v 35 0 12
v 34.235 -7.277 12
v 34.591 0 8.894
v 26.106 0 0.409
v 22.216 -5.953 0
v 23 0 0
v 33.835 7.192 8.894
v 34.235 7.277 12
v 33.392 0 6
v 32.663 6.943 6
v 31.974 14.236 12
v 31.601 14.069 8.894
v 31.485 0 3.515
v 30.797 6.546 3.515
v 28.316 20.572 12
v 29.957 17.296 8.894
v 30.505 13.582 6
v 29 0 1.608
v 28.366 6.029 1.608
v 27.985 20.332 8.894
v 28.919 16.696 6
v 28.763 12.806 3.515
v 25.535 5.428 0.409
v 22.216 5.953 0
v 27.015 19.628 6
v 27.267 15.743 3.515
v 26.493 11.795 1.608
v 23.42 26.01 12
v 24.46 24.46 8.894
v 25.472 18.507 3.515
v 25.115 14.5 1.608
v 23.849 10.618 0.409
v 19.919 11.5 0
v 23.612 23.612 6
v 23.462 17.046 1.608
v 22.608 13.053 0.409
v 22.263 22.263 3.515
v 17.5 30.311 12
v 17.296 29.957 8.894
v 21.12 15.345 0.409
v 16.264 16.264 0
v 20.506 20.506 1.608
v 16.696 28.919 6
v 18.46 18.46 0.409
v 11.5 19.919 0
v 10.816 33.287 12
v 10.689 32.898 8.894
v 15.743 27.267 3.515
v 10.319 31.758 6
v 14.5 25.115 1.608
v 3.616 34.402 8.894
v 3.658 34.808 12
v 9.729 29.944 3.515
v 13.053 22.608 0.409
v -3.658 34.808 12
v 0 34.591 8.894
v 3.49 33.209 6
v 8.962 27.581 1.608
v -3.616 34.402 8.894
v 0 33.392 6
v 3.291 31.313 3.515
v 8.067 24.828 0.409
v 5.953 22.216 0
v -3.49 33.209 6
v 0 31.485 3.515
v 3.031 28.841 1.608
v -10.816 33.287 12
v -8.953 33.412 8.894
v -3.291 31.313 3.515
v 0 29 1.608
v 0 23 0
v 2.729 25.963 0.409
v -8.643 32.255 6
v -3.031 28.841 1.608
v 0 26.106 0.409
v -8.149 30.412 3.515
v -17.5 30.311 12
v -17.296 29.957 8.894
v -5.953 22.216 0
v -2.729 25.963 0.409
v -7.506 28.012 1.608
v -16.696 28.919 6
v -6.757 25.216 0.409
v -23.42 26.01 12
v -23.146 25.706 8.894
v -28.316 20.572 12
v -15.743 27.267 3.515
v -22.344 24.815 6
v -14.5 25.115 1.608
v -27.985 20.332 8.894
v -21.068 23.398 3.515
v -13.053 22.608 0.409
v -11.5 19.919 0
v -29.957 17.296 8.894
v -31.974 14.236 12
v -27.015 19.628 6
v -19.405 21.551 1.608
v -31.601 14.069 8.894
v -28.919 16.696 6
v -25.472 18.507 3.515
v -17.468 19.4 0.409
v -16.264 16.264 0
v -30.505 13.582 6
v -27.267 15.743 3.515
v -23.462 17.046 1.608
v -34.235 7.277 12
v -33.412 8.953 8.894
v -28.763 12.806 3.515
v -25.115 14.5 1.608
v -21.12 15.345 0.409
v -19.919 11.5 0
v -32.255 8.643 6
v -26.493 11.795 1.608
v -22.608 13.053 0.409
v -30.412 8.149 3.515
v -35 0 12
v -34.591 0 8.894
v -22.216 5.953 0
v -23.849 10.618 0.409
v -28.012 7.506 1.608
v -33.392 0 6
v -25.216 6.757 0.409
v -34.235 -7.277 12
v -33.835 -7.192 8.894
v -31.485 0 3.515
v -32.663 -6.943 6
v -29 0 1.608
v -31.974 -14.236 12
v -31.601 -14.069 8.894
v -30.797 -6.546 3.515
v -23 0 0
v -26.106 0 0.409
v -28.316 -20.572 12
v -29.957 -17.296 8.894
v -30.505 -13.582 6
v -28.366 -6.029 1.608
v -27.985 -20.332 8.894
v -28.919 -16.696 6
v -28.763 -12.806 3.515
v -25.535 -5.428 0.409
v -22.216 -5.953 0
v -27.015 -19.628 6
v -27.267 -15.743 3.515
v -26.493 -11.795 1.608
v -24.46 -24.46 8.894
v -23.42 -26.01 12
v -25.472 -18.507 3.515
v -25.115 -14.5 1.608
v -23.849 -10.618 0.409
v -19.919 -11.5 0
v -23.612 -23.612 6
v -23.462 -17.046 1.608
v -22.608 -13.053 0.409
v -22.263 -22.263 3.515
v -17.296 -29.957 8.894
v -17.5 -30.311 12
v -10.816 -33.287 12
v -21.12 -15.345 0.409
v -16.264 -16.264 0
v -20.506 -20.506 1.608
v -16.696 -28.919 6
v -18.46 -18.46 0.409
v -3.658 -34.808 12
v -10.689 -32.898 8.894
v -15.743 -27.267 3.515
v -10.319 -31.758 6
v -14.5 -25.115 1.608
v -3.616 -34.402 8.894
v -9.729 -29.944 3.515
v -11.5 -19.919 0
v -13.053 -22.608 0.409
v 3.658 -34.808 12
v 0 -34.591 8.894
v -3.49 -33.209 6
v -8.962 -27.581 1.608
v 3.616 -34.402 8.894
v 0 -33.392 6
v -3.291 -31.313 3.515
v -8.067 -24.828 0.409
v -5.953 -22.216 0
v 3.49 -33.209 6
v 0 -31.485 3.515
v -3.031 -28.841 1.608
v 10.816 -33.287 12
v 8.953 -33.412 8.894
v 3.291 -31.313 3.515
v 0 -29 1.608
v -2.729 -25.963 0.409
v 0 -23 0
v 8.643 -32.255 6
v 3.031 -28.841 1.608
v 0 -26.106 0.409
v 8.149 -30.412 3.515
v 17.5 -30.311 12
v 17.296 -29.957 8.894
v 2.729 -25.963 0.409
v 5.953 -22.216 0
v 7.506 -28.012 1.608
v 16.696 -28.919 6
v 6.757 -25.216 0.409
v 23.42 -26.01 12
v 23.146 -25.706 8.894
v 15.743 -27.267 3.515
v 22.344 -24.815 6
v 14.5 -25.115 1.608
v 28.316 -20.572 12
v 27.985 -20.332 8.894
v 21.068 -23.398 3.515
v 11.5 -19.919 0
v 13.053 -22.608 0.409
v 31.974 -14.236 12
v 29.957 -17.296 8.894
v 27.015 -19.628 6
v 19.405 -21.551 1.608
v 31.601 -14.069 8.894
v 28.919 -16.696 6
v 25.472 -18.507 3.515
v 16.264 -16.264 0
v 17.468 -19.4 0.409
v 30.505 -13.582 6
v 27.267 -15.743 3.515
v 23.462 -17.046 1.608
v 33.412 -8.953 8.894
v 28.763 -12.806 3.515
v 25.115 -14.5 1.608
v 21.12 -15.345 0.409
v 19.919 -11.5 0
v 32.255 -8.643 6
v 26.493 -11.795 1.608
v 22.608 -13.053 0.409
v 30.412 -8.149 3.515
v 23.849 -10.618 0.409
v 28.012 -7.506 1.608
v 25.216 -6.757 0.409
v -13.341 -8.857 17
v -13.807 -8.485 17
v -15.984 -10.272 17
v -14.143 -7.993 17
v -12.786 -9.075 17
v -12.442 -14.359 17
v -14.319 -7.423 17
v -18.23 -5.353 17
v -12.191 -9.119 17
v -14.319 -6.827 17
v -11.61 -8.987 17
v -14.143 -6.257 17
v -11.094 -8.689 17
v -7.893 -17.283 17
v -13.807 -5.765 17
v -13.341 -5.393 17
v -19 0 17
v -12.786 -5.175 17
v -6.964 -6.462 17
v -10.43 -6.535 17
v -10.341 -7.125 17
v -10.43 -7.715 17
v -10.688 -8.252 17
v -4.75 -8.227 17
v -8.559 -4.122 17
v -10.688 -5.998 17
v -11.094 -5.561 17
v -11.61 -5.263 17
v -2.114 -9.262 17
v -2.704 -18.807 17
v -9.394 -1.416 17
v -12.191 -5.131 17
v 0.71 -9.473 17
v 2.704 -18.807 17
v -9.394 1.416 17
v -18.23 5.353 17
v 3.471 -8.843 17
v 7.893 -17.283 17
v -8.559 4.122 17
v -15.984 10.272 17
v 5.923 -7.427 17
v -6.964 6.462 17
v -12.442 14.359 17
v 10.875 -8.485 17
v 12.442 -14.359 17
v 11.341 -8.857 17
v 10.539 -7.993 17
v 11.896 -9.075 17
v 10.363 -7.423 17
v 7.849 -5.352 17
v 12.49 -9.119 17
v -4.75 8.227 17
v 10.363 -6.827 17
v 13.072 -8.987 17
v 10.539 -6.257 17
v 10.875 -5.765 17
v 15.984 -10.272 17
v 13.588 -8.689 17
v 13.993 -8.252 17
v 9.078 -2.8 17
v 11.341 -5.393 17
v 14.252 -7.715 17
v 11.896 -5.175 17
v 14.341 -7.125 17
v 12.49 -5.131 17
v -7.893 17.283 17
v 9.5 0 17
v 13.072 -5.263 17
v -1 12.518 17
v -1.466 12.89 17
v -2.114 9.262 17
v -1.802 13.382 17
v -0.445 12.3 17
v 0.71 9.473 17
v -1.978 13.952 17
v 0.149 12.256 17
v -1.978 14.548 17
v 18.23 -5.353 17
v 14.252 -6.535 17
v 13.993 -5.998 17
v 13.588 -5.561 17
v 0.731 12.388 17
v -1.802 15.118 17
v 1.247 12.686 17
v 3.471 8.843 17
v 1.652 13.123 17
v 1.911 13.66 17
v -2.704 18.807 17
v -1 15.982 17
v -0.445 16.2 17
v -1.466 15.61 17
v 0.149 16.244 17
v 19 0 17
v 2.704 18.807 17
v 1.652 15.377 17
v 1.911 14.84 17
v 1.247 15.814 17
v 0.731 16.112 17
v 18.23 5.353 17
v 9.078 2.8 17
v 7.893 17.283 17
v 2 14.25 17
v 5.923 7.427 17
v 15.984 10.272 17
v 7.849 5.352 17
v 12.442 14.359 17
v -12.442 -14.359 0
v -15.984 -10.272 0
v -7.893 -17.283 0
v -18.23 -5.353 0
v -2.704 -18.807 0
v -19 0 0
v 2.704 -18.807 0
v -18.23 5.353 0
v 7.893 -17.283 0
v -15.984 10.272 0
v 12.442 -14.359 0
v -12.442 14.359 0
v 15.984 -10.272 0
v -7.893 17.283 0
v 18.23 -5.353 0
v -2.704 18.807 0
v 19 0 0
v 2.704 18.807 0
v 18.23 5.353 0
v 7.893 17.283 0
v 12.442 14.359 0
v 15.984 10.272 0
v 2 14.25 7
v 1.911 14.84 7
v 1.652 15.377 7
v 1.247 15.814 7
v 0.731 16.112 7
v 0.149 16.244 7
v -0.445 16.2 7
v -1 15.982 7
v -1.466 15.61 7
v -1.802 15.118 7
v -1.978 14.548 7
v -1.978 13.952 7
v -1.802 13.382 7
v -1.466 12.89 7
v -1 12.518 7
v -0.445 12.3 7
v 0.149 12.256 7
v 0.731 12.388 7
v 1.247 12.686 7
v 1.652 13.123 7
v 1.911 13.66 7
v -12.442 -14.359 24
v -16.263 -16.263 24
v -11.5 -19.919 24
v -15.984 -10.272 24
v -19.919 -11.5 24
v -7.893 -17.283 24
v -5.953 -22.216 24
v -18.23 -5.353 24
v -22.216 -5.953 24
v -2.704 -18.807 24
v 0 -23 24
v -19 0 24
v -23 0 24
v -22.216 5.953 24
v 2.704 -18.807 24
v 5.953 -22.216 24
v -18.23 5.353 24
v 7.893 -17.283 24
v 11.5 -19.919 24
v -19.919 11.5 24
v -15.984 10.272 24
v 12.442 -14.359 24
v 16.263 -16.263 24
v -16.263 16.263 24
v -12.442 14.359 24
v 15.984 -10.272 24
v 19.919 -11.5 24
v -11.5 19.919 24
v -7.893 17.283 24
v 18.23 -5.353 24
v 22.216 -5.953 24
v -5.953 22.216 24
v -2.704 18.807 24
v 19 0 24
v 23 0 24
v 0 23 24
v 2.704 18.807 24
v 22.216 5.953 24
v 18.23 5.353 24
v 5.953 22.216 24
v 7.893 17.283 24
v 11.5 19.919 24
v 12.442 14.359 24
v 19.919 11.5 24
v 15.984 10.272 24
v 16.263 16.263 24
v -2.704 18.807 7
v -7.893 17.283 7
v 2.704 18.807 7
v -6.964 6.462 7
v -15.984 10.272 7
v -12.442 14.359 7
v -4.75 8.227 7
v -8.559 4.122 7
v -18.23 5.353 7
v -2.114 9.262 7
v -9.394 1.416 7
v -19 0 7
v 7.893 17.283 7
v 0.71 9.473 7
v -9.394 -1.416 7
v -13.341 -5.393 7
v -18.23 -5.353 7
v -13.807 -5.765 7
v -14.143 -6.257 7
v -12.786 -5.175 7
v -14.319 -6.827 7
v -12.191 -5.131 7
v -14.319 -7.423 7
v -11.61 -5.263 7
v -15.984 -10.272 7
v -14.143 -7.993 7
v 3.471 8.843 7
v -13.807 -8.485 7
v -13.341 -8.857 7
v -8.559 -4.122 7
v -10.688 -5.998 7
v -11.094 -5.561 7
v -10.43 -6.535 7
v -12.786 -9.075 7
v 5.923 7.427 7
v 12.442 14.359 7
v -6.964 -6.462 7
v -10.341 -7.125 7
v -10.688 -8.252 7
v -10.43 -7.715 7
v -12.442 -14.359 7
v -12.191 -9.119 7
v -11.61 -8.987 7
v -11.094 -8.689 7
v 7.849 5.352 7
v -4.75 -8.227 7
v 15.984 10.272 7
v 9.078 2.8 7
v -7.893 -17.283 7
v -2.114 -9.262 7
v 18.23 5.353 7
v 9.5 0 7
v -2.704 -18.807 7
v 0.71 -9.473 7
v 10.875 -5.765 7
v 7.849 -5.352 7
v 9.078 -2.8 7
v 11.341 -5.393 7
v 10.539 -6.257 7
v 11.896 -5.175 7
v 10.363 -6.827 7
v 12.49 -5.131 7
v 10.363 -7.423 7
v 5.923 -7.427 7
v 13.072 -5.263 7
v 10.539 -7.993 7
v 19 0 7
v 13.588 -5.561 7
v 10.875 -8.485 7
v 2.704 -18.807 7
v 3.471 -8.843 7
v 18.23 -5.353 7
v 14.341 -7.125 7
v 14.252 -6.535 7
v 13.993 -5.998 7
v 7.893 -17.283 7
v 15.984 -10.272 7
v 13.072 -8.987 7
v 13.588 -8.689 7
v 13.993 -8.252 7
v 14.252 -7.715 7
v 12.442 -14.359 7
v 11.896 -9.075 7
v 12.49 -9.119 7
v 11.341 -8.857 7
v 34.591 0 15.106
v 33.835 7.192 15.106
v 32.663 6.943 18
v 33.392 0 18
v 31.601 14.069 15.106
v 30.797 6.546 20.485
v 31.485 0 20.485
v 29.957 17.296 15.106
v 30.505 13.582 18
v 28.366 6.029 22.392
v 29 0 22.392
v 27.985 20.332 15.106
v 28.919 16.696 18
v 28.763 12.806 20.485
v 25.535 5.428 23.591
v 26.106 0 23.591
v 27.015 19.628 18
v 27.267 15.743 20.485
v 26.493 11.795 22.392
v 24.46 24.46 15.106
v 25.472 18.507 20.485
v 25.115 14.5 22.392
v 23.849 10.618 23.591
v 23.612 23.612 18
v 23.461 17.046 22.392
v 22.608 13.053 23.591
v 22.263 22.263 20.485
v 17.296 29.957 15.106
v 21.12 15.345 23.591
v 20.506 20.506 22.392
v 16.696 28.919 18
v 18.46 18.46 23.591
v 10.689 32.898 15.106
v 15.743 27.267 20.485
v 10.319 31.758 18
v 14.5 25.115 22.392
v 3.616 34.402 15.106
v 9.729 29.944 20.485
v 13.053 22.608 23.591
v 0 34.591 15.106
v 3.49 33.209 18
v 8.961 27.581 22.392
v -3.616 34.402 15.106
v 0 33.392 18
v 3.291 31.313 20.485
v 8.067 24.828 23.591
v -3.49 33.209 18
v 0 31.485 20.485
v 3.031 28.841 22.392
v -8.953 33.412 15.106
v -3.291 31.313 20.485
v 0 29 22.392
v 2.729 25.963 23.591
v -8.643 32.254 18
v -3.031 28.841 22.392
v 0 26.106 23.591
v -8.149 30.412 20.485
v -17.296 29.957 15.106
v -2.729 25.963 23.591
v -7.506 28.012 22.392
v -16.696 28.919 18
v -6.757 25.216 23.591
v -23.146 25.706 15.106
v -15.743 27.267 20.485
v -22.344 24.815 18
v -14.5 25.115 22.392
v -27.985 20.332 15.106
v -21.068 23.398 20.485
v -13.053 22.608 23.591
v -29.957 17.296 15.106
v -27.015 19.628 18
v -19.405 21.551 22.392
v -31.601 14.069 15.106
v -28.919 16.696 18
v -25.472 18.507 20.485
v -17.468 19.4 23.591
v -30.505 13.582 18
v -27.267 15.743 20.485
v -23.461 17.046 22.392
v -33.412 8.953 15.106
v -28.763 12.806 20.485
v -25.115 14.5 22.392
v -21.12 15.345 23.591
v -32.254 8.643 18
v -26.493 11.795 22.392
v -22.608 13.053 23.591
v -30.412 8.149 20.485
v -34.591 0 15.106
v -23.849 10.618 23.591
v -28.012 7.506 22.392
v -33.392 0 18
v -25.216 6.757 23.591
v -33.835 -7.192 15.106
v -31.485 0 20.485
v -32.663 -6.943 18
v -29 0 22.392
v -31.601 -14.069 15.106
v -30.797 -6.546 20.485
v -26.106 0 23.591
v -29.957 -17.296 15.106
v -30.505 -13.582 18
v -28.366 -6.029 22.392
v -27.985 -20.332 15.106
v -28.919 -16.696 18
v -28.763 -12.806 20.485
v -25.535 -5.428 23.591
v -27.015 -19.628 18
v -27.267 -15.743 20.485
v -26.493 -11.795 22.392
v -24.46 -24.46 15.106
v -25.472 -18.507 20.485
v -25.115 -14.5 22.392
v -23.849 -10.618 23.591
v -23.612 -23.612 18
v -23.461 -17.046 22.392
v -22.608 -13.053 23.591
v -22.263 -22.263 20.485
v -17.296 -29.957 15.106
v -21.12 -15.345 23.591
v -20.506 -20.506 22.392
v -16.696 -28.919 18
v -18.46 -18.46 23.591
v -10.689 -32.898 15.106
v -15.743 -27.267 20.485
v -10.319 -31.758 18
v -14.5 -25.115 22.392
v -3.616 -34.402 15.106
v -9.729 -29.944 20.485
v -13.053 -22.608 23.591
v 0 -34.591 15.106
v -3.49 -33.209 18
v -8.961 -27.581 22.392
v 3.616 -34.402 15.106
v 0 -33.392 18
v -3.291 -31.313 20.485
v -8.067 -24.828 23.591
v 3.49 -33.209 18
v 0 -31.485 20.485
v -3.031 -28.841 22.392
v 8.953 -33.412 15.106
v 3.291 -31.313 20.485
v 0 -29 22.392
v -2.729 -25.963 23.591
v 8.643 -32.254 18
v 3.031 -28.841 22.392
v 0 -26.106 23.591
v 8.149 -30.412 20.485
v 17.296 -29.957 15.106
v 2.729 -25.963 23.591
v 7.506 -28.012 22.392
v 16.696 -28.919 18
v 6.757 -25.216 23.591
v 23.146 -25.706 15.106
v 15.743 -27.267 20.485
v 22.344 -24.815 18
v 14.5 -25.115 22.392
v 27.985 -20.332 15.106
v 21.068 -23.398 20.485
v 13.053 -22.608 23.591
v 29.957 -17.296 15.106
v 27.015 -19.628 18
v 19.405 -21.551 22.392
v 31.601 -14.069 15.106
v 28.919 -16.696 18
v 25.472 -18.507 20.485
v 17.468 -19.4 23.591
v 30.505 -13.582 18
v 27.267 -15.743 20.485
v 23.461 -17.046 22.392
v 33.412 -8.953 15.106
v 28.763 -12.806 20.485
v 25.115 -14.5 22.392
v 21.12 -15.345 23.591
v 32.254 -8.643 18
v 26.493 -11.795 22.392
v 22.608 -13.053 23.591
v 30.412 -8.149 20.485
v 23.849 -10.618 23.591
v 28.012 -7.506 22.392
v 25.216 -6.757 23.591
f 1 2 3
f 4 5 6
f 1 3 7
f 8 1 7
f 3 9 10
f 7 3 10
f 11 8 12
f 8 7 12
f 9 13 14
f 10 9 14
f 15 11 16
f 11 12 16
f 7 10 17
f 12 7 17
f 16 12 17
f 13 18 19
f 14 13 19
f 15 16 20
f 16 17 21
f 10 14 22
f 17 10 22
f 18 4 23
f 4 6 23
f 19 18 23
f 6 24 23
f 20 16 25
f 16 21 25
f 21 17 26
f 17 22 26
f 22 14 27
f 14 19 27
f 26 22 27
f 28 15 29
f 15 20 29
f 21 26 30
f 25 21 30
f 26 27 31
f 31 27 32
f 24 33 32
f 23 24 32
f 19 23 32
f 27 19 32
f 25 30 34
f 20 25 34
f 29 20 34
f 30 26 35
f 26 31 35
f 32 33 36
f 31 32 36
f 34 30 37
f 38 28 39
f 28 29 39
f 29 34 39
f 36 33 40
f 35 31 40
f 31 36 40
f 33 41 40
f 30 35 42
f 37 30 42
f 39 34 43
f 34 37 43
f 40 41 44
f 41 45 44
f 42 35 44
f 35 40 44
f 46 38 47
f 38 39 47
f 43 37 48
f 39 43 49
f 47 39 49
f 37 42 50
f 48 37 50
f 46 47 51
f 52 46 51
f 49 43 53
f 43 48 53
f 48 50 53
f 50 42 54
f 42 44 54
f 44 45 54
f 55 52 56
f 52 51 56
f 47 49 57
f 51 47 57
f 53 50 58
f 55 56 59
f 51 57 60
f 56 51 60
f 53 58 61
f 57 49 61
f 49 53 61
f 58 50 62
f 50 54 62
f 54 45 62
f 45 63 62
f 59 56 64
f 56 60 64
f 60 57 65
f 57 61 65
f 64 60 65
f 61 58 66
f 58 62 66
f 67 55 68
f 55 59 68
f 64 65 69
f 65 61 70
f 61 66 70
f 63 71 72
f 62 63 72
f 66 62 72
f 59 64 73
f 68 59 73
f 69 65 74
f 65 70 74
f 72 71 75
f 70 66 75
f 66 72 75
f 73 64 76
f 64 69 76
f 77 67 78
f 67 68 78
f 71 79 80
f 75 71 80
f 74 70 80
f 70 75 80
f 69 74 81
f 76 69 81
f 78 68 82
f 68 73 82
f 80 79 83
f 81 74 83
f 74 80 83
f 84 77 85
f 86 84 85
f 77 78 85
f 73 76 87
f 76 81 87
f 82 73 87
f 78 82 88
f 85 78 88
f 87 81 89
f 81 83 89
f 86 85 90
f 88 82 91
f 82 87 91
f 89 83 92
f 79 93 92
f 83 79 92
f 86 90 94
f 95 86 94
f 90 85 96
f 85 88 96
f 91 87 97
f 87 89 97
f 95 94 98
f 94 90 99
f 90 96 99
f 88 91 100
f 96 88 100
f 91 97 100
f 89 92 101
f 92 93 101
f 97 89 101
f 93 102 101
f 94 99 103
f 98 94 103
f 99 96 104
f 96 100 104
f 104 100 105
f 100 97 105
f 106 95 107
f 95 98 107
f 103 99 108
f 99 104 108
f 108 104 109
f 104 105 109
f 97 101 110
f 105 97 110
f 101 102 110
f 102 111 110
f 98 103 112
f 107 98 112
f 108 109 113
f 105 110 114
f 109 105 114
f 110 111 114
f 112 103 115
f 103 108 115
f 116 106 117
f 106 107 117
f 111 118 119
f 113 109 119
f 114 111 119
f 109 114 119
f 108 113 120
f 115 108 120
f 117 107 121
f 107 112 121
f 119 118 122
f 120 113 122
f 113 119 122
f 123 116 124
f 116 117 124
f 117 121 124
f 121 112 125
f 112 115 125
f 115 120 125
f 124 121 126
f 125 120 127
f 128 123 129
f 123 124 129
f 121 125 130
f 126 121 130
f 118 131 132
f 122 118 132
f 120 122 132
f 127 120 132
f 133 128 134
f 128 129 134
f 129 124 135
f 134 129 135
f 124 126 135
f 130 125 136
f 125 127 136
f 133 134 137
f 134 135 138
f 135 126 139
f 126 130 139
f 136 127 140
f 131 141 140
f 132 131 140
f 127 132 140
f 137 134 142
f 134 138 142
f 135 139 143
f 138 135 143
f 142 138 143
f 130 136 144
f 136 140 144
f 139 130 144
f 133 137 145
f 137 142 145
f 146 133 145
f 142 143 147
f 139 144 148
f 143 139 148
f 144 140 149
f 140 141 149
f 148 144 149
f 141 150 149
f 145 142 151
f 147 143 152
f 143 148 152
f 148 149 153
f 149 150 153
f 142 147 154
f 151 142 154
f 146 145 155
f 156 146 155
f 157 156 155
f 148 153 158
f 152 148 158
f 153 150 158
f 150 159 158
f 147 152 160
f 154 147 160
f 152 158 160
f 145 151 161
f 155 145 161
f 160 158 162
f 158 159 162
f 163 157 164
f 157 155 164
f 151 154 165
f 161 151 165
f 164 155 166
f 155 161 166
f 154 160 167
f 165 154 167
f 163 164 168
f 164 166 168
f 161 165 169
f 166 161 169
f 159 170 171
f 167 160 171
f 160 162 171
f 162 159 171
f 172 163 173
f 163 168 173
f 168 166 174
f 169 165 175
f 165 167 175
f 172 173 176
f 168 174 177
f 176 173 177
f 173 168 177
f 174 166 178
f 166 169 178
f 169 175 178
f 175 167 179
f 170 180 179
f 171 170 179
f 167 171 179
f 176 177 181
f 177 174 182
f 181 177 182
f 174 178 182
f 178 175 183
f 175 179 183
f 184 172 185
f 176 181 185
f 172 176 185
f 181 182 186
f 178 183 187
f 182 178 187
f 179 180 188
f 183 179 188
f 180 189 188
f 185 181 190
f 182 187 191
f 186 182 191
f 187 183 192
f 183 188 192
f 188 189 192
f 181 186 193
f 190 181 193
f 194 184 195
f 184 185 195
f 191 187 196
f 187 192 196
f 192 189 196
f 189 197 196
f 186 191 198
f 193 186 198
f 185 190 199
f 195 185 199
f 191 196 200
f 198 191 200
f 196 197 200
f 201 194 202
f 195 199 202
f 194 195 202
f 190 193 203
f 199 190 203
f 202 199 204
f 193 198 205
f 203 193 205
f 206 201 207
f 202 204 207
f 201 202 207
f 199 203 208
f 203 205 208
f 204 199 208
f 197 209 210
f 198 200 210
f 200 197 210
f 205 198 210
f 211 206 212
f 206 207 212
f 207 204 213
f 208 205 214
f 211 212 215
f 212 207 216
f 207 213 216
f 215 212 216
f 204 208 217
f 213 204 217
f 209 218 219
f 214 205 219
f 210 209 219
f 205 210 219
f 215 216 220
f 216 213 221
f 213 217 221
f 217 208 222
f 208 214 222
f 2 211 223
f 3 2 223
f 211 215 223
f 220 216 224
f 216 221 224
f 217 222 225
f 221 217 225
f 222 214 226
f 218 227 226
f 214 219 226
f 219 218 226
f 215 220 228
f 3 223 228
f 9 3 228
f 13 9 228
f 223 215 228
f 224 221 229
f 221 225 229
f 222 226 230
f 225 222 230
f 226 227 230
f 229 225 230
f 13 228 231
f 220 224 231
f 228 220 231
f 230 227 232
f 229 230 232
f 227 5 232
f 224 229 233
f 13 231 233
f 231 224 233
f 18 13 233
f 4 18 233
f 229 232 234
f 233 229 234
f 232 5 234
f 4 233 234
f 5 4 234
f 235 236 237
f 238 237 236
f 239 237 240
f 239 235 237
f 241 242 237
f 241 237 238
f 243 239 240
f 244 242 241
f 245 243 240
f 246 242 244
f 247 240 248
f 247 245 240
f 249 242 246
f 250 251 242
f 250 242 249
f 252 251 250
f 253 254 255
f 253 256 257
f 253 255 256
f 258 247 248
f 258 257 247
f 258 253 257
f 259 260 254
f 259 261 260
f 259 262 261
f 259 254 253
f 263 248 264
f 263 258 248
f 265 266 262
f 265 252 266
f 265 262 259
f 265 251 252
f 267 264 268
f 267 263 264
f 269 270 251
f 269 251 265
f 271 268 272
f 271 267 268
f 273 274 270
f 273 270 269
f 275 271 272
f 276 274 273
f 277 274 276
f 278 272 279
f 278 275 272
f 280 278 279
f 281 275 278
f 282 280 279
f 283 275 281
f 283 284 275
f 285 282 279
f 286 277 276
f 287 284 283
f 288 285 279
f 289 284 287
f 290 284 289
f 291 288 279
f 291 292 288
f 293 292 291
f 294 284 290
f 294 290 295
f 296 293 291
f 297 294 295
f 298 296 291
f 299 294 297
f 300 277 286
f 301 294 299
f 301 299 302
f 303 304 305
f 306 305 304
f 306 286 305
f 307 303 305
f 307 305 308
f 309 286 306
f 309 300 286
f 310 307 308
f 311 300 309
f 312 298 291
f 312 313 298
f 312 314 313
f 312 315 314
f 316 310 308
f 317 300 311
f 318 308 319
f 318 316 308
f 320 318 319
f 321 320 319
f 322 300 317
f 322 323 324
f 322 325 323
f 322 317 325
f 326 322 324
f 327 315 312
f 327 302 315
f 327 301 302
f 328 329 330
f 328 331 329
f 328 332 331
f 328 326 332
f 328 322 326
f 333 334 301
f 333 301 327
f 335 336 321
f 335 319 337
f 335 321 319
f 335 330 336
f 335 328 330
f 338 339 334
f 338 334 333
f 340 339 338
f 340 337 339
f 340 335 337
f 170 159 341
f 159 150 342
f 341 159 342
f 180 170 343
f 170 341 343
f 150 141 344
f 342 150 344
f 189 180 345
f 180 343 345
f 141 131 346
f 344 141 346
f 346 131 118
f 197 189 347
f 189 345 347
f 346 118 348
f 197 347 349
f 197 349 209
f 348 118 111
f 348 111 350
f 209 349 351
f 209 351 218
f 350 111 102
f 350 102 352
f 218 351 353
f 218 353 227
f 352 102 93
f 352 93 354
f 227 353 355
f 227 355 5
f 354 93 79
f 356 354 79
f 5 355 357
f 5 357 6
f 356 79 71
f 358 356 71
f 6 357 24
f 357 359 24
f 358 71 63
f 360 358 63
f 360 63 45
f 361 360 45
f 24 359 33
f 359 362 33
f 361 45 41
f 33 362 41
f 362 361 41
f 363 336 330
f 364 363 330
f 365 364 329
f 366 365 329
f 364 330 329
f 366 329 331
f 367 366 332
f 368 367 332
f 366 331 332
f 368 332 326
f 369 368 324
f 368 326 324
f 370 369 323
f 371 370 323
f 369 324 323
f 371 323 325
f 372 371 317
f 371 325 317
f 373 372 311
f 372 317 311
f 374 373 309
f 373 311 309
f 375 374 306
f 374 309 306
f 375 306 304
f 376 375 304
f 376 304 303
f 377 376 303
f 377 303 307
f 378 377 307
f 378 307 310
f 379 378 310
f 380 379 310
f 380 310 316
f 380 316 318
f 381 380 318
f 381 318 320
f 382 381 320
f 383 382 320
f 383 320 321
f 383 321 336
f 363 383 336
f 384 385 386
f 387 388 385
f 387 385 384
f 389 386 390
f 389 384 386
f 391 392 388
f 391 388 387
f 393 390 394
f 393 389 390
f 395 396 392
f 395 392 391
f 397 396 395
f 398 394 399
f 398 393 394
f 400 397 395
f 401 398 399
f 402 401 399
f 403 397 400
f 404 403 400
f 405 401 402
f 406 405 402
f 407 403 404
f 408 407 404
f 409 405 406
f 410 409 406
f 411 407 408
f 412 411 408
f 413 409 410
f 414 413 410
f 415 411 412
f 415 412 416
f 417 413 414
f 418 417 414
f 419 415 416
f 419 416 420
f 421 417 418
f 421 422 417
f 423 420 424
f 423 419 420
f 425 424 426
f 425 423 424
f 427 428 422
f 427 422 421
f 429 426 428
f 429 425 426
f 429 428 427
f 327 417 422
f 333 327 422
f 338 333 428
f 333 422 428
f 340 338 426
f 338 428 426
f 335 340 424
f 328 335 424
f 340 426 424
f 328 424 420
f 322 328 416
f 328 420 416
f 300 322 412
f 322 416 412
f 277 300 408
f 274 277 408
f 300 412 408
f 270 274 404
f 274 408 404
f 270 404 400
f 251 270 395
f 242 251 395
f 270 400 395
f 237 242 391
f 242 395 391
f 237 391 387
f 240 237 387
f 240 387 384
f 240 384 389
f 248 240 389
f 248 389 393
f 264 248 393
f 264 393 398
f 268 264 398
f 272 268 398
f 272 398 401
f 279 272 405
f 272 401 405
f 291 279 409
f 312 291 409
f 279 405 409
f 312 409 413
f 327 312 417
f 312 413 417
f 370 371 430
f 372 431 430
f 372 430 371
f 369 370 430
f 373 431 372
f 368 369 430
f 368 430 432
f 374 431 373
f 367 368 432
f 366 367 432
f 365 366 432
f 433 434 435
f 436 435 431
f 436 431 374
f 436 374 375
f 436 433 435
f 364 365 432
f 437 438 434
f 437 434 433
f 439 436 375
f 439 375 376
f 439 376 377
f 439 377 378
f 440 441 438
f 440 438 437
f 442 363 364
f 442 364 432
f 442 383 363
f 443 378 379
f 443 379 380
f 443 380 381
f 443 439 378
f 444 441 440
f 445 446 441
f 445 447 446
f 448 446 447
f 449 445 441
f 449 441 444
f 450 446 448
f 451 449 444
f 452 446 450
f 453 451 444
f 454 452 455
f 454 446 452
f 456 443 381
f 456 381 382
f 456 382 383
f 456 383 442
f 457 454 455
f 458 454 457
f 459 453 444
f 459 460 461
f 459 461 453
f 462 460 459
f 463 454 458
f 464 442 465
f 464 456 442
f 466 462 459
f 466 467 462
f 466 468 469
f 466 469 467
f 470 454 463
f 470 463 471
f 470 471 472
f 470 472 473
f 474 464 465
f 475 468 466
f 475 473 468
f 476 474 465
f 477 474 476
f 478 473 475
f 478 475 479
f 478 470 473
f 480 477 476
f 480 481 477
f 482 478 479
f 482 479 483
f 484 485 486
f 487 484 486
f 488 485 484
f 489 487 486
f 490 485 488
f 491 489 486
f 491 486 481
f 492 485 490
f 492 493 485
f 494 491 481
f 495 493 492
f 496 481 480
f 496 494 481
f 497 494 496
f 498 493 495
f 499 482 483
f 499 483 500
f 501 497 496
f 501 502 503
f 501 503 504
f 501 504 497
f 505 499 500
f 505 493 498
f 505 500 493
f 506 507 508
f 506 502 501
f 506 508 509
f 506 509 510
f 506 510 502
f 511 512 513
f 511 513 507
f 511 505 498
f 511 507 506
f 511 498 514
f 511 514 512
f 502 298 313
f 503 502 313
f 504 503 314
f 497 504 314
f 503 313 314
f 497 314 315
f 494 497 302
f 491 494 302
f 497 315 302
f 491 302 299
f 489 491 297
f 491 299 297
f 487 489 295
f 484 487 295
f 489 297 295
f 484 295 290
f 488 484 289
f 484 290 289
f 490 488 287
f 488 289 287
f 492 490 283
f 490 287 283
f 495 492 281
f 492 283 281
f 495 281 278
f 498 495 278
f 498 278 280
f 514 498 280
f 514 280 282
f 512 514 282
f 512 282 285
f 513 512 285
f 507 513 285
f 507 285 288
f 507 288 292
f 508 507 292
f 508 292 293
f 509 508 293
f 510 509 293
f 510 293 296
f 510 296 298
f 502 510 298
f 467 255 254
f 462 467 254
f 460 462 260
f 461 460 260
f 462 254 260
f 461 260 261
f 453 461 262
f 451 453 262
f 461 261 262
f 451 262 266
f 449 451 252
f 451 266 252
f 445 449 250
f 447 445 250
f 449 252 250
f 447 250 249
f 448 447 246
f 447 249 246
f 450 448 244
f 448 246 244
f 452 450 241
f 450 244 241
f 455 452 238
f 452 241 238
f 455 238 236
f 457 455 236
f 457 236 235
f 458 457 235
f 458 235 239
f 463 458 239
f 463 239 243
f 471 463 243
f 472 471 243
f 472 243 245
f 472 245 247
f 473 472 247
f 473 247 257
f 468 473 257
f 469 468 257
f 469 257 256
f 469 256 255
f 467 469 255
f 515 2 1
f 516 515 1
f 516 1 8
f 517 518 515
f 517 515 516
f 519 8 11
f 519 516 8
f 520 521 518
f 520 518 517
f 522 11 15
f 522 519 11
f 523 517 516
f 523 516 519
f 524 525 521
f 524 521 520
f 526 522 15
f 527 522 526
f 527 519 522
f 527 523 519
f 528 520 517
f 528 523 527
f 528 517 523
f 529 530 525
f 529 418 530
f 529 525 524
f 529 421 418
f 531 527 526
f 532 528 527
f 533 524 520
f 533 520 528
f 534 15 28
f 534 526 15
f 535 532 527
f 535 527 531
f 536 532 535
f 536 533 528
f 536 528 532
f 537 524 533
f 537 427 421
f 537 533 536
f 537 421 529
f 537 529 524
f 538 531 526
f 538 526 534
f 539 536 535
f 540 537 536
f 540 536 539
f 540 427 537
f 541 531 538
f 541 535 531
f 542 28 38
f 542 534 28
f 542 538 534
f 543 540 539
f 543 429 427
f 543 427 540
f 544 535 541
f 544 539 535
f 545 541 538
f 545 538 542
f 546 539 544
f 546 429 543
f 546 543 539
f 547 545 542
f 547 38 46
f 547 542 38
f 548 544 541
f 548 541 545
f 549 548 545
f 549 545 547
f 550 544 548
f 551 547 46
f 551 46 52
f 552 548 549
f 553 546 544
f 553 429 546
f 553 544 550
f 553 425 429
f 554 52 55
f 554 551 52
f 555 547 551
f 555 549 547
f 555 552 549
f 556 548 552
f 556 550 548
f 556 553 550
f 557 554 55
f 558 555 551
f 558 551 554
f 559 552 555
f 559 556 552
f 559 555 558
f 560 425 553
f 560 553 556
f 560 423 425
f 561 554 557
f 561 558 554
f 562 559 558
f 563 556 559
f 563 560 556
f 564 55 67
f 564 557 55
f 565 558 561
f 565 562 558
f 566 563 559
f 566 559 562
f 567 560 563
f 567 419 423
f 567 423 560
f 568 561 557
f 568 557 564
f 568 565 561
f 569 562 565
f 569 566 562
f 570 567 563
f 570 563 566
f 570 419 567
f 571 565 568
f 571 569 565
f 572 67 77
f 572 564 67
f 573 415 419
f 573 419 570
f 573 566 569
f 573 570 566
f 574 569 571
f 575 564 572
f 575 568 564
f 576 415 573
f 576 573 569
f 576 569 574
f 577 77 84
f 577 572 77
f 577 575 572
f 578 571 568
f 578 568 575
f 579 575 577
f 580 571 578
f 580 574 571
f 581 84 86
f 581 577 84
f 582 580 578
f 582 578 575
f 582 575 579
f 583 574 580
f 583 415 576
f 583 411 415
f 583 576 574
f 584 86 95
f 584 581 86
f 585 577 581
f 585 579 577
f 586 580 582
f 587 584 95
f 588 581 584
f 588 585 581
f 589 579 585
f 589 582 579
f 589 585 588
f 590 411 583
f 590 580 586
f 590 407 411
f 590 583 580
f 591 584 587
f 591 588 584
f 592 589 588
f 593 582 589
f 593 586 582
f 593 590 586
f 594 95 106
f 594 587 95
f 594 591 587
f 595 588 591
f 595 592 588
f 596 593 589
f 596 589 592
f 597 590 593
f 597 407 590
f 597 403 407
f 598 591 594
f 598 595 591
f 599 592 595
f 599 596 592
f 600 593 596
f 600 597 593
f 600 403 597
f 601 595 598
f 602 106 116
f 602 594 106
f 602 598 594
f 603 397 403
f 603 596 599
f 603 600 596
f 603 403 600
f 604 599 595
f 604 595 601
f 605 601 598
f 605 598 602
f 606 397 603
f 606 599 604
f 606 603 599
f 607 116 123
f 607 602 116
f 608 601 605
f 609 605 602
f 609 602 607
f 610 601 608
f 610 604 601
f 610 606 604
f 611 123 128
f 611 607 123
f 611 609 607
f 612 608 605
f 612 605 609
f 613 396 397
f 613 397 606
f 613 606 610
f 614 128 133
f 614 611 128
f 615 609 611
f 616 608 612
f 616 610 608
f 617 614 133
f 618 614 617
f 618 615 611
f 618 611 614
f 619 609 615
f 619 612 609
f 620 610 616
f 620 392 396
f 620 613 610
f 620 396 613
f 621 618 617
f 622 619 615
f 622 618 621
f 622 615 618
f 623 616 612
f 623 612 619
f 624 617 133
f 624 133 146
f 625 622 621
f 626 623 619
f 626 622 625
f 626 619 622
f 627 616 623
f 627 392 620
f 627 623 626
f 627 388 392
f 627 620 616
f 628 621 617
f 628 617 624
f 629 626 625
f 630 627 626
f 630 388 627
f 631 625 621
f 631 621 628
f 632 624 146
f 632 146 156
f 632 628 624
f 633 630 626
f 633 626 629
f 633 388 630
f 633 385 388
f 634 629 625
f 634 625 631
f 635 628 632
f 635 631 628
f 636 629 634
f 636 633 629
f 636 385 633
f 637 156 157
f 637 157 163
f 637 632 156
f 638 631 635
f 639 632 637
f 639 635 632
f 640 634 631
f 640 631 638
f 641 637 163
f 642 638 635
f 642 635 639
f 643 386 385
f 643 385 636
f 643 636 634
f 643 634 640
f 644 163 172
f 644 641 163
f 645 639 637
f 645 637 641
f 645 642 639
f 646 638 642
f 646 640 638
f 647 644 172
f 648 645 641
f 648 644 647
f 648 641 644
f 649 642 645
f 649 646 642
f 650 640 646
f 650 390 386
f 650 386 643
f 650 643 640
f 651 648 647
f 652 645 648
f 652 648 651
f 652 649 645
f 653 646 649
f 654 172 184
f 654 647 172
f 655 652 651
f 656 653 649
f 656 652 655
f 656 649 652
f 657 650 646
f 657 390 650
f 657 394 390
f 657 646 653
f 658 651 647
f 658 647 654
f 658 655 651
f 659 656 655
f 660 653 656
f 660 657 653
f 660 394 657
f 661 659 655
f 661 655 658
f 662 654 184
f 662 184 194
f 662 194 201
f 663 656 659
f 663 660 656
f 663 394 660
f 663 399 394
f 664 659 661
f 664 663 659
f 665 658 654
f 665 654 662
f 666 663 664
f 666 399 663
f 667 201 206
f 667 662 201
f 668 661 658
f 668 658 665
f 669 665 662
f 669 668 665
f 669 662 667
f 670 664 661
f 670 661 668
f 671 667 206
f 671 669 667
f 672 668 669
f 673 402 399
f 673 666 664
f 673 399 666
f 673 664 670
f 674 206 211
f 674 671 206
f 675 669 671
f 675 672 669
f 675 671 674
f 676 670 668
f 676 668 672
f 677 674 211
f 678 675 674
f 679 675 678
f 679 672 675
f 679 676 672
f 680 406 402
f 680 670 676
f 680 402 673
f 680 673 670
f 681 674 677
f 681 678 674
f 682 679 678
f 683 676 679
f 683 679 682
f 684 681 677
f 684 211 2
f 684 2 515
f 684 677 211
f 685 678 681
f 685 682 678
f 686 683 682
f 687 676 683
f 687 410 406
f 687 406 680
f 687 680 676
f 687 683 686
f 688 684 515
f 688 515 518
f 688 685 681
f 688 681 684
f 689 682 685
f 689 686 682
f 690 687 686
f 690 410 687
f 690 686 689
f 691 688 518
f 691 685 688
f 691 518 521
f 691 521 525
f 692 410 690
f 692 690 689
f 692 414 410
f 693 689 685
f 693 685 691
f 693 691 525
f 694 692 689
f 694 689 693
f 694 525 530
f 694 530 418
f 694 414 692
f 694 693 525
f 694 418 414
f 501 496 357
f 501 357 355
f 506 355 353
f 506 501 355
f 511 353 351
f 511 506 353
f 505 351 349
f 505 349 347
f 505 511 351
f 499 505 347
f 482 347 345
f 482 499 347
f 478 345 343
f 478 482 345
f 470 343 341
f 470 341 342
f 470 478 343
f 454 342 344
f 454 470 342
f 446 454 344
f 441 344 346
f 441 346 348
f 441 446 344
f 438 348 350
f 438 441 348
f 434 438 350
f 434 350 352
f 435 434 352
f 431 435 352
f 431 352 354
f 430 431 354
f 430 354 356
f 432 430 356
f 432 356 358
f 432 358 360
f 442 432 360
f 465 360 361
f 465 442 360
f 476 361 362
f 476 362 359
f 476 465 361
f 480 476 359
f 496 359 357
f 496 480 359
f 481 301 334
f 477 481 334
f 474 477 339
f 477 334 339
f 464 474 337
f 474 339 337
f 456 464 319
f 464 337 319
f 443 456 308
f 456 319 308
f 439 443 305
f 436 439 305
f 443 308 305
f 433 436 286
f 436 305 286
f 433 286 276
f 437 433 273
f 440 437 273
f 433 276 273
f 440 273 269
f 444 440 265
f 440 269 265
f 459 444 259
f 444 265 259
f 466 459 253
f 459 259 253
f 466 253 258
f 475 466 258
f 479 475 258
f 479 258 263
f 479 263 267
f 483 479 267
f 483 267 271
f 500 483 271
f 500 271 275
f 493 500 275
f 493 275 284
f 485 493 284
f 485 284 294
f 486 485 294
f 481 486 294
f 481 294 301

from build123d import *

# Parameters (mm, degrees)
ESQUISSE1_R             = 35
EXTRUSION1_DEPTH        = 24
CONG_1_R                = 12
CONG_2_R                = 12
ESQUISSE2_R             = 19
ENL_V_MAT_EXTRU_1_DEPTH = 7
ENL_V_START             = -7
ESQUISSE3_R             = 19
ENL_V_MAT_EXTRU_2_DEPTH = 7
ESQUISSE5_R             = 9.5
ESQUISSE5_R_2           = 2
ENL_V_MAT_EXTRU_3_DEPTH = 53.335456499


with BuildPart() as part:
    # Esquisse1 → Extrusion1 (new body)
    with BuildSketch(Plane.XY):
        Circle(ESQUISSE1_R)
    extrude(amount=EXTRUSION1_DEPTH)

    # Congé1
    cong_1_edges = [part.edges().sort_by_distance(p)[0] for p in [
        (-35, 0, 24),
    ]]
    fillet(cong_1_edges, radius=CONG_1_R)

    # Congé2
    cong_2_edges = [part.edges().sort_by_distance(p)[0] for p in [
        (-35, 0, 0),
    ]]
    fillet(cong_2_edges, radius=CONG_2_R - 0.0001)  # a hair under: the kernel refuses the full size

    # Esquisse2 → Enlèv. mat.-Extru.1 (cut)
    with BuildSketch(Plane.XY.offset(24)):
        Circle(ESQUISSE2_R)
    extrude(amount=-ENL_V_MAT_EXTRU_1_DEPTH, mode=Mode.SUBTRACT)

    # Esquisse3 → Enlèv. mat.-Extru.2 (cut)
    with BuildSketch(Plane(origin=(0, 0, 0), x_dir=(-1, 0, 0), z_dir=(0, 0, -1)).offset(ENL_V_START)):
        with Locations(Location((0, 0, 0), (0, 0, 180))):
            Circle(ESQUISSE3_R)
    extrude(amount=ENL_V_MAT_EXTRU_2_DEPTH, mode=Mode.SUBTRACT)

    # Esquisse5 → Enlèv. mat.-Extru.3 (cut, through all)
    with BuildSketch(Plane.XY.offset(17)):
        Circle(ESQUISSE5_R)
        with Locations((0, 14.25)):
            Circle(ESQUISSE5_R_2)
        with Locations((12.340862004, -7.125)):
            Circle(ESQUISSE5_R_2)
        with Locations((-12.340862004, -7.125)):
            Circle(ESQUISSE5_R_2)
    extrude(amount=-ENL_V_MAT_EXTRU_3_DEPTH, mode=Mode.SUBTRACT)


solid = part.part
